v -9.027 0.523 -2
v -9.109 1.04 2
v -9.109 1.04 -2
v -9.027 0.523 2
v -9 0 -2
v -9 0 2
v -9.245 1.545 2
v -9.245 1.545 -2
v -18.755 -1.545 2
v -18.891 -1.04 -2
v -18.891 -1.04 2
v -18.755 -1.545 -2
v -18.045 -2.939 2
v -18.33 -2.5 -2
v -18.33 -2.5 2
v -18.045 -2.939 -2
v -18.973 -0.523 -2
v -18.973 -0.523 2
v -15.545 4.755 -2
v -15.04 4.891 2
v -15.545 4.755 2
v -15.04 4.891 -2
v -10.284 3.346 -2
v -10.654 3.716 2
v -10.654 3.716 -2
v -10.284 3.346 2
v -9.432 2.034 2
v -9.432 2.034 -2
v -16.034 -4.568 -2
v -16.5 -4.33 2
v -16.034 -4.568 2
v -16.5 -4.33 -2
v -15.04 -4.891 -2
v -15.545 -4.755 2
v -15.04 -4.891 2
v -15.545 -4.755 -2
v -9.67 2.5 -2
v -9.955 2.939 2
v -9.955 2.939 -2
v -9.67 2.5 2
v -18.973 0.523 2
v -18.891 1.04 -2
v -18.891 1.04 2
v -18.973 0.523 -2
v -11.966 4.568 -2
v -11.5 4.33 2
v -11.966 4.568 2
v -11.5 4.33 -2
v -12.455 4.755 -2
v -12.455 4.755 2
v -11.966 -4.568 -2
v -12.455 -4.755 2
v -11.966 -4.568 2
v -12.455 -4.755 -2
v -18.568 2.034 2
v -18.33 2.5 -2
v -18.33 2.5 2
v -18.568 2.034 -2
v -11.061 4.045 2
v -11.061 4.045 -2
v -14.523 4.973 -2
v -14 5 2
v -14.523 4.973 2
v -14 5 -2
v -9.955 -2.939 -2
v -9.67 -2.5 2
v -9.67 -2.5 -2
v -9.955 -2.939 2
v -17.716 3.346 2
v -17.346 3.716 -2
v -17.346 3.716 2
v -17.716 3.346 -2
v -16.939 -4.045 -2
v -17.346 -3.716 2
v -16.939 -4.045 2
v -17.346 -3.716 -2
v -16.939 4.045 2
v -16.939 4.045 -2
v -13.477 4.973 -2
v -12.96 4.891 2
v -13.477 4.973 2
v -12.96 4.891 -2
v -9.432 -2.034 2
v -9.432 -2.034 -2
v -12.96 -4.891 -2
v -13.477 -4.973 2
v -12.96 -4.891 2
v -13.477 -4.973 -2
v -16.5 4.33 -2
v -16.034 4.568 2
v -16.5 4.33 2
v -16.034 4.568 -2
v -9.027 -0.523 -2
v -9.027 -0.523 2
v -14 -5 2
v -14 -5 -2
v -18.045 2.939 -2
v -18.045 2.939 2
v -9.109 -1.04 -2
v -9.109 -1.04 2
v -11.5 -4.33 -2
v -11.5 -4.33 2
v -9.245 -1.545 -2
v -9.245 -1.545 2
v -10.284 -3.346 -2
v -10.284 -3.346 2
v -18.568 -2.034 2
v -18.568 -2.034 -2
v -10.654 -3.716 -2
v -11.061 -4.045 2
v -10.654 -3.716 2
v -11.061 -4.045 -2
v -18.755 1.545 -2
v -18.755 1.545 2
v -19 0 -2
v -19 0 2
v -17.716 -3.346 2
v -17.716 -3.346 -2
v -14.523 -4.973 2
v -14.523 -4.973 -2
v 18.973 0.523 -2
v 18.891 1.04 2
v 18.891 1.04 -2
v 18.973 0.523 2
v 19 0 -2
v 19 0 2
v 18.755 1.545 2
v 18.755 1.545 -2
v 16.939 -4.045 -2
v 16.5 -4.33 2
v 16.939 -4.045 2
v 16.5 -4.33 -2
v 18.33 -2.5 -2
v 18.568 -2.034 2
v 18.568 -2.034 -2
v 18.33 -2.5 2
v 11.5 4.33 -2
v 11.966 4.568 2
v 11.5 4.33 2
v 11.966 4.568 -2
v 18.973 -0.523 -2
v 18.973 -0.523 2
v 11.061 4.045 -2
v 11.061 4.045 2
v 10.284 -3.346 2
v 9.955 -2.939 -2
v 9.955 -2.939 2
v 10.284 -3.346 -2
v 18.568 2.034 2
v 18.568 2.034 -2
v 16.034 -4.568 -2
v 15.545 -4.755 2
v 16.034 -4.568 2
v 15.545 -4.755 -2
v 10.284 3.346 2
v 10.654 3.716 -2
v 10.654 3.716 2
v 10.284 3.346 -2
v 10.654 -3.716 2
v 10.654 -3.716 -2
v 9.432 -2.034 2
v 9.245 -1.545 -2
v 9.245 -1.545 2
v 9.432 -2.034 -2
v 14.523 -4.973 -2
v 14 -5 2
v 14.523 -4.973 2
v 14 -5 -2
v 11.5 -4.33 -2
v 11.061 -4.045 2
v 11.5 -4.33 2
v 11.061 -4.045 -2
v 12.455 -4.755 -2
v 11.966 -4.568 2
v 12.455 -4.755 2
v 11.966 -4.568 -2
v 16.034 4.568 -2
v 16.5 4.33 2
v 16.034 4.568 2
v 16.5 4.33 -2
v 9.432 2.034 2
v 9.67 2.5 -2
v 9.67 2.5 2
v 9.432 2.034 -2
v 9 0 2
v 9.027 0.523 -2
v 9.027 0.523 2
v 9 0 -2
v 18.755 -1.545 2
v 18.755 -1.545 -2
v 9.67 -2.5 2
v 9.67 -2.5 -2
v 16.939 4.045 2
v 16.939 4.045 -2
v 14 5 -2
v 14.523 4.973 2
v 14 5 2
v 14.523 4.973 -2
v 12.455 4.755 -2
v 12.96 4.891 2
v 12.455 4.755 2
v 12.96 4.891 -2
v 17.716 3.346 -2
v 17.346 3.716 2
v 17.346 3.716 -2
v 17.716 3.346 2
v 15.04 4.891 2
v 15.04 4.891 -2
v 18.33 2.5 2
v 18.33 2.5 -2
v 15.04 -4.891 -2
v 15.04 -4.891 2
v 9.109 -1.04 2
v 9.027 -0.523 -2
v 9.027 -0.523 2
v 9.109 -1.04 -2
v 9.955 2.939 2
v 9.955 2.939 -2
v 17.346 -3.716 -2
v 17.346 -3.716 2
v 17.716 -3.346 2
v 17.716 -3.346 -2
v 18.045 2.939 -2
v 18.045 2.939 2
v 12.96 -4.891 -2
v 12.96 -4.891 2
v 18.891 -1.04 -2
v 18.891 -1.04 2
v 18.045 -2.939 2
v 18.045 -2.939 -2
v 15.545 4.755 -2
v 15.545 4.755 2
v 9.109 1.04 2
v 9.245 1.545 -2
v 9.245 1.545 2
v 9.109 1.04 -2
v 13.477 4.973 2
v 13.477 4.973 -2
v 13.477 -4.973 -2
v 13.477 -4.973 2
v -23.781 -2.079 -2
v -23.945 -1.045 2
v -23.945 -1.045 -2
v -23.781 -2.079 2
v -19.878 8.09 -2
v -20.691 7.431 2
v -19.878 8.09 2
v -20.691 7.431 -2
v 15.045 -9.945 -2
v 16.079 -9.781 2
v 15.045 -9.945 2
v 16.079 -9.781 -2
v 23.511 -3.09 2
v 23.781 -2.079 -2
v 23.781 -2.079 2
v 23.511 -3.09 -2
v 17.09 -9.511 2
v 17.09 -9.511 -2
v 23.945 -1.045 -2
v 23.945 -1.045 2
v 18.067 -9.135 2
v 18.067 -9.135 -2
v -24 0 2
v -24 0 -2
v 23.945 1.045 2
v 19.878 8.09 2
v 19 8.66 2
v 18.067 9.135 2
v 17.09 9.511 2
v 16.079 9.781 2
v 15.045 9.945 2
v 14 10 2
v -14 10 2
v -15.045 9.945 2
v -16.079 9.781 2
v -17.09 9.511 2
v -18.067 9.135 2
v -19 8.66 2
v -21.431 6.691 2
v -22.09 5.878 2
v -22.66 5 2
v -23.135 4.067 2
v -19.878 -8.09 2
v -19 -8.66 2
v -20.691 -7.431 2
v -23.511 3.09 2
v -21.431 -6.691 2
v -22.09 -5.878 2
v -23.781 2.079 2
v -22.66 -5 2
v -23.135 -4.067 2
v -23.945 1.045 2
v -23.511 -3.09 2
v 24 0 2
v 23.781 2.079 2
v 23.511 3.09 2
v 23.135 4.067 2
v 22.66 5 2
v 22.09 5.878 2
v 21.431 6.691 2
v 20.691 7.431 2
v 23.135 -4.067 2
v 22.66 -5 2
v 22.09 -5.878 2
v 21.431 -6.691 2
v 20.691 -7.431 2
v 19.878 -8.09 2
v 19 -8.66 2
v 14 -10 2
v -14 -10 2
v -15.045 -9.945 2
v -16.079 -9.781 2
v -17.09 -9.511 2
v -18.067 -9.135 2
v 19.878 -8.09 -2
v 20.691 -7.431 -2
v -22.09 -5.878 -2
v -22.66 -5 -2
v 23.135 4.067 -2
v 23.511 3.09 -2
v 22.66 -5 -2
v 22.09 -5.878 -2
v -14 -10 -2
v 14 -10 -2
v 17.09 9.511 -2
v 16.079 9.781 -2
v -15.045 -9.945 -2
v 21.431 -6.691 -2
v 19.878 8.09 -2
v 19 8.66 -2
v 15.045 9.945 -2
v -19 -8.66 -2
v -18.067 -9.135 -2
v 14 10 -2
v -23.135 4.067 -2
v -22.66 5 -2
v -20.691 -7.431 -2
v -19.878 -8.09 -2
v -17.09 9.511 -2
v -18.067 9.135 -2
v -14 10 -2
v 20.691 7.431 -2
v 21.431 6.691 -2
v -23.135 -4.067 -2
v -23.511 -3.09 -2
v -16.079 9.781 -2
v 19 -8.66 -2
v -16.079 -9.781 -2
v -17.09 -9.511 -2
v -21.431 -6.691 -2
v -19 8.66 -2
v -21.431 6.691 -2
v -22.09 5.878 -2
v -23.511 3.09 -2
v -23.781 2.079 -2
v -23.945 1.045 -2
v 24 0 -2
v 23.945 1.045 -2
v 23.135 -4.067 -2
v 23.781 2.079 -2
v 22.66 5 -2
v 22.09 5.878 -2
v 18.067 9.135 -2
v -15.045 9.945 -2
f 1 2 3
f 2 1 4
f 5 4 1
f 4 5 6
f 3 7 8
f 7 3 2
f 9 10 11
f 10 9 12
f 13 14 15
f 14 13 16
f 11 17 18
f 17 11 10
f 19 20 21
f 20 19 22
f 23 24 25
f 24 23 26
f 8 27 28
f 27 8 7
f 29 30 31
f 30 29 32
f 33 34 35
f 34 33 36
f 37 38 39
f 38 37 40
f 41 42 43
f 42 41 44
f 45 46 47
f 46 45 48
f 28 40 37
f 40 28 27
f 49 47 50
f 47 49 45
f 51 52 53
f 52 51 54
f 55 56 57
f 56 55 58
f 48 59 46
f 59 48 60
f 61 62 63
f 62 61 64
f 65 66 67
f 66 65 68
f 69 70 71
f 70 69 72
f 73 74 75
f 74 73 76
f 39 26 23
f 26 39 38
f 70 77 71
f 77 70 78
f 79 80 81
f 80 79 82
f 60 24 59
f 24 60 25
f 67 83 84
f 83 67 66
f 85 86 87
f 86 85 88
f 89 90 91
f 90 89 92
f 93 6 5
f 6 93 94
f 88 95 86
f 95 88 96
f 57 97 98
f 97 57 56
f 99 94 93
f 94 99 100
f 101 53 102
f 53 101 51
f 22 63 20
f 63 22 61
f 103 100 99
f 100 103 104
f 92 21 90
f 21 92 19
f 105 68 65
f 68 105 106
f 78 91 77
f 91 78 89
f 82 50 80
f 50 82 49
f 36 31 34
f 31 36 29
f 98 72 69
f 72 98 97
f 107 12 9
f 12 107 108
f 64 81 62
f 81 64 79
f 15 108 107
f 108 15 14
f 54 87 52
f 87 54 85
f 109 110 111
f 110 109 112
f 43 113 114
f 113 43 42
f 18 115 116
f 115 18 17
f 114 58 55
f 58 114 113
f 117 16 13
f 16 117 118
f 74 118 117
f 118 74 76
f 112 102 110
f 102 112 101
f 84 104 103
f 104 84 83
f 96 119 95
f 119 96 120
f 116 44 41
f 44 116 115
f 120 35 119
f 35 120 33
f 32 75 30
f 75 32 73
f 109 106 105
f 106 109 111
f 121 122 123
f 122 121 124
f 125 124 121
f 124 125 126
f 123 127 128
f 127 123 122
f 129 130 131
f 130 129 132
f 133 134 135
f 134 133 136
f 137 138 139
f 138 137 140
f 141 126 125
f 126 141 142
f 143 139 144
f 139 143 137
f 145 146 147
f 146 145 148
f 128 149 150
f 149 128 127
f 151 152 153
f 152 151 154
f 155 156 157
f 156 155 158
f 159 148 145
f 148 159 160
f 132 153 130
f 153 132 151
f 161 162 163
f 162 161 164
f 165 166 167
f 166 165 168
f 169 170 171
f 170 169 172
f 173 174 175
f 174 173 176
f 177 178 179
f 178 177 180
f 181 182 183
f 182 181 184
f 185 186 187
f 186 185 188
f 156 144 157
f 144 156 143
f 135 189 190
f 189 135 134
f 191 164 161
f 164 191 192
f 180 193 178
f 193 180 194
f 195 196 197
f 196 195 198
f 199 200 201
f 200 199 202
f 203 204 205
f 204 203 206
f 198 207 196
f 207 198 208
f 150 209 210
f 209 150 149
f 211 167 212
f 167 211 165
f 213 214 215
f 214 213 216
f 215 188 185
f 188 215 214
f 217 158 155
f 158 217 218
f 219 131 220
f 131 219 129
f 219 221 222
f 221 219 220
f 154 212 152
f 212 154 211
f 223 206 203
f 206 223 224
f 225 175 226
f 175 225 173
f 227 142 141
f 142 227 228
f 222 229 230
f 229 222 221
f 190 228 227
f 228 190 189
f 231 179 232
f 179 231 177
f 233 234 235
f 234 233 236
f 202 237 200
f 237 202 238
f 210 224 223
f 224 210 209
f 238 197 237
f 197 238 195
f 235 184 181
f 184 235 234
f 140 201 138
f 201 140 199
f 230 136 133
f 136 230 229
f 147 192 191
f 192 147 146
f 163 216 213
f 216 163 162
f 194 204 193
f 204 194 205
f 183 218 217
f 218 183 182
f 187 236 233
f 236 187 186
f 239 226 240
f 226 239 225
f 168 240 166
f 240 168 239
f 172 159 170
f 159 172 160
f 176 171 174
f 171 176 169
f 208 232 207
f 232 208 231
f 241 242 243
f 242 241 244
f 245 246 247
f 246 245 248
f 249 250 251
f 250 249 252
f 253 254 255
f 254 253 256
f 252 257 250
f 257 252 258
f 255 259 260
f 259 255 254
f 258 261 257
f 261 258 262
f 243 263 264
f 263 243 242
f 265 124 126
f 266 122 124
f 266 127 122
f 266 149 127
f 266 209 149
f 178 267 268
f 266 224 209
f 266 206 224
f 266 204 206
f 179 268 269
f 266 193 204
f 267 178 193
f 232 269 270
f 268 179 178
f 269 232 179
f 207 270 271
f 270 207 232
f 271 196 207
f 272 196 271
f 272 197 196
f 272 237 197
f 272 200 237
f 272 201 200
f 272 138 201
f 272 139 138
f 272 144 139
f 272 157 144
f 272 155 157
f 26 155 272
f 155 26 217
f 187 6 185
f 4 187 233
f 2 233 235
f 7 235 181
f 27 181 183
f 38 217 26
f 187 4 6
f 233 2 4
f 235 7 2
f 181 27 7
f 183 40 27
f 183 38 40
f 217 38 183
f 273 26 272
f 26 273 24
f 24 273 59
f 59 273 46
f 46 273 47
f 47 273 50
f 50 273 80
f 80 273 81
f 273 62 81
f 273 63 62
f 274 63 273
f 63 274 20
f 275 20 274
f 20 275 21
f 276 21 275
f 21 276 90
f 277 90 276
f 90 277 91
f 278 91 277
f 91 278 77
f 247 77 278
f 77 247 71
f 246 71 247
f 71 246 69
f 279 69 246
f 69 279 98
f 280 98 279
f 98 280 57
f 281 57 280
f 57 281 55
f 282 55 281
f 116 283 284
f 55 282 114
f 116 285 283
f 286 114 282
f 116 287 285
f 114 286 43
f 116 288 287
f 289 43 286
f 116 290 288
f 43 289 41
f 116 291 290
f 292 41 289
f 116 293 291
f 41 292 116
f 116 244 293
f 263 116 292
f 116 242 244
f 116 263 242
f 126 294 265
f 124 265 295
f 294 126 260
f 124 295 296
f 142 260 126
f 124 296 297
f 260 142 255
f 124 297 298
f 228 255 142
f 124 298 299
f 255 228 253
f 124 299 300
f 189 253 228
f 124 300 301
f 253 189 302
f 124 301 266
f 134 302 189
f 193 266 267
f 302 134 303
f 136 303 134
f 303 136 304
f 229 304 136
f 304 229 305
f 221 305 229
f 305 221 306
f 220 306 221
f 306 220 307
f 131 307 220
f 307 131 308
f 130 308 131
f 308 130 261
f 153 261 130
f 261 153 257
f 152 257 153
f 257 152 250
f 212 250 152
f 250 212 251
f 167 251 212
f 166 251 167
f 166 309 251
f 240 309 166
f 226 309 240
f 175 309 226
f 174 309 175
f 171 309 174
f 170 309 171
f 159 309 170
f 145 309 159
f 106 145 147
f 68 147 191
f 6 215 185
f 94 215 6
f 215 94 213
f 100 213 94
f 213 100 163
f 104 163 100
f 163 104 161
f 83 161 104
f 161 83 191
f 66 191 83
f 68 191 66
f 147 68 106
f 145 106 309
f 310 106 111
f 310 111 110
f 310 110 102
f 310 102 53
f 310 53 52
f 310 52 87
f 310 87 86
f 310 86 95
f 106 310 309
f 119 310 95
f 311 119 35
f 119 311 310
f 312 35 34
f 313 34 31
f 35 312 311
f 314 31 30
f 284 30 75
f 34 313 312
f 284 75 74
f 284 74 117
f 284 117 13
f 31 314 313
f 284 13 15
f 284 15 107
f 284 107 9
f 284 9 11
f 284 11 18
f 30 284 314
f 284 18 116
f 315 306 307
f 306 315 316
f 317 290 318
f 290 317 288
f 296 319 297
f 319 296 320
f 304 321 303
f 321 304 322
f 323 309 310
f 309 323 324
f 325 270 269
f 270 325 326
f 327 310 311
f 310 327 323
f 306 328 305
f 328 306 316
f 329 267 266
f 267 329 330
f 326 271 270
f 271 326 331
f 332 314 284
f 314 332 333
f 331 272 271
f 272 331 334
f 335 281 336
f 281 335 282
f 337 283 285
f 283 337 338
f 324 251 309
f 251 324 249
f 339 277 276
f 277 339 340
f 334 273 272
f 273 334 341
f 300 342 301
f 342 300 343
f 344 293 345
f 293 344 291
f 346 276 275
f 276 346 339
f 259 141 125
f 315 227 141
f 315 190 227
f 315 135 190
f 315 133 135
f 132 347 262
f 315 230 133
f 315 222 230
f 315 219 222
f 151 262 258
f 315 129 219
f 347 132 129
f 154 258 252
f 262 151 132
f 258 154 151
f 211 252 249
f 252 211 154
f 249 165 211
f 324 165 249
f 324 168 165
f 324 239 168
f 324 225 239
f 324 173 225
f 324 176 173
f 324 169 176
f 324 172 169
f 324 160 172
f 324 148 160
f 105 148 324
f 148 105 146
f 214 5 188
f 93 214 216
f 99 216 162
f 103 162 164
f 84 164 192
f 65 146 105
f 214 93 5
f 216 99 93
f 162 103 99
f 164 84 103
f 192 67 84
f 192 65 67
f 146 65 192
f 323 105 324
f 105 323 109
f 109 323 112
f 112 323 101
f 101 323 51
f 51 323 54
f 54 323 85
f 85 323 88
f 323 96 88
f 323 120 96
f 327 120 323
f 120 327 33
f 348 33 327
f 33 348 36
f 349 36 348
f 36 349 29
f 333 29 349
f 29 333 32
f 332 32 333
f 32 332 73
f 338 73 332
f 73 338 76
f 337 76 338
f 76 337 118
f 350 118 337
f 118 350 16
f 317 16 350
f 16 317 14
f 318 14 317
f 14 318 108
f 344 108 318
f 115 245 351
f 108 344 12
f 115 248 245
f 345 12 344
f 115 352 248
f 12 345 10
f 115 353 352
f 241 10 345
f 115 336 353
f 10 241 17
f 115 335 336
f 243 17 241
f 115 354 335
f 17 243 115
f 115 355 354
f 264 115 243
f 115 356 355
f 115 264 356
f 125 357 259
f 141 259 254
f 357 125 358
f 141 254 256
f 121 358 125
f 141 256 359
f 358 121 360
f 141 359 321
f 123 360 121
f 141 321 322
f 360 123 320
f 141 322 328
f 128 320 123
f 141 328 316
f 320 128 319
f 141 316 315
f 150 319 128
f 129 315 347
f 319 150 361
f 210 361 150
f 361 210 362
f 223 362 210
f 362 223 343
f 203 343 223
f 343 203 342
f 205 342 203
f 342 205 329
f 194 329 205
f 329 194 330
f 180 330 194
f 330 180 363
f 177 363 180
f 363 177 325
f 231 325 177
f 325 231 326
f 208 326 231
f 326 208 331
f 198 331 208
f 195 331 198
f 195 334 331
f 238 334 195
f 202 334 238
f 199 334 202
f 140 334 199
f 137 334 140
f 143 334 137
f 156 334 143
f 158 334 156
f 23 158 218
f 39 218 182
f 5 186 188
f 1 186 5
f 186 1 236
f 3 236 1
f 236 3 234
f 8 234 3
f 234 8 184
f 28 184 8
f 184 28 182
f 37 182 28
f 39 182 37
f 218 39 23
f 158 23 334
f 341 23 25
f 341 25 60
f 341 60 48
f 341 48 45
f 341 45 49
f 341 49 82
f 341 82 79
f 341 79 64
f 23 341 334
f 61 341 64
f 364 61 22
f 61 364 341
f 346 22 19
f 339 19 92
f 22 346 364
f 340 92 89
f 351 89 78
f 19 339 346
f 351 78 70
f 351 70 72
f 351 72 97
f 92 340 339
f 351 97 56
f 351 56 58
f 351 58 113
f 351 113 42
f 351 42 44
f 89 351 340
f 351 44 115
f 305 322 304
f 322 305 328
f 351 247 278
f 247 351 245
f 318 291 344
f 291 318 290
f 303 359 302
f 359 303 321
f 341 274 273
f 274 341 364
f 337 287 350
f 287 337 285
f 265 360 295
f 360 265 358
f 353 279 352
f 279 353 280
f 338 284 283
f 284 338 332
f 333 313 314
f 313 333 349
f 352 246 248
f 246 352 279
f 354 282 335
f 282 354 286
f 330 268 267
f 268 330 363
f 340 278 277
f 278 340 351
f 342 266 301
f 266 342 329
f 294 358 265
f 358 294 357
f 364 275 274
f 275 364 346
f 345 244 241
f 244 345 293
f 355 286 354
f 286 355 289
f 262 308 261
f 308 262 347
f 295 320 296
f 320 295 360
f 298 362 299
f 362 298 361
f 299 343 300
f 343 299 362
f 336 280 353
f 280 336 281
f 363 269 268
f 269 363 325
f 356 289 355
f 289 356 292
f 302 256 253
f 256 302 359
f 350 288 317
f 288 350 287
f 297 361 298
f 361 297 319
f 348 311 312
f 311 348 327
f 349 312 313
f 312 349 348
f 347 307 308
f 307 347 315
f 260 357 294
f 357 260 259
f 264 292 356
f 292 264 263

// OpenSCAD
// Two-hole link plate.
$fn = 60;
eps = 0.02;
hole_d = 10;
length = 48;
width = 20;
thickness = 4;
difference() { hull() { translate([-length/2+width/2,0,0]) cylinder(d=width,h=thickness,center=true); translate([length/2-width/2,0,0]) cylinder(d=width,h=thickness,center=true); } for(x=[-length/2+width/2,length/2-width/2]) translate([x,0,-thickness/2-eps]) cylinder(d=hole_d,h=thickness+2*eps); }
